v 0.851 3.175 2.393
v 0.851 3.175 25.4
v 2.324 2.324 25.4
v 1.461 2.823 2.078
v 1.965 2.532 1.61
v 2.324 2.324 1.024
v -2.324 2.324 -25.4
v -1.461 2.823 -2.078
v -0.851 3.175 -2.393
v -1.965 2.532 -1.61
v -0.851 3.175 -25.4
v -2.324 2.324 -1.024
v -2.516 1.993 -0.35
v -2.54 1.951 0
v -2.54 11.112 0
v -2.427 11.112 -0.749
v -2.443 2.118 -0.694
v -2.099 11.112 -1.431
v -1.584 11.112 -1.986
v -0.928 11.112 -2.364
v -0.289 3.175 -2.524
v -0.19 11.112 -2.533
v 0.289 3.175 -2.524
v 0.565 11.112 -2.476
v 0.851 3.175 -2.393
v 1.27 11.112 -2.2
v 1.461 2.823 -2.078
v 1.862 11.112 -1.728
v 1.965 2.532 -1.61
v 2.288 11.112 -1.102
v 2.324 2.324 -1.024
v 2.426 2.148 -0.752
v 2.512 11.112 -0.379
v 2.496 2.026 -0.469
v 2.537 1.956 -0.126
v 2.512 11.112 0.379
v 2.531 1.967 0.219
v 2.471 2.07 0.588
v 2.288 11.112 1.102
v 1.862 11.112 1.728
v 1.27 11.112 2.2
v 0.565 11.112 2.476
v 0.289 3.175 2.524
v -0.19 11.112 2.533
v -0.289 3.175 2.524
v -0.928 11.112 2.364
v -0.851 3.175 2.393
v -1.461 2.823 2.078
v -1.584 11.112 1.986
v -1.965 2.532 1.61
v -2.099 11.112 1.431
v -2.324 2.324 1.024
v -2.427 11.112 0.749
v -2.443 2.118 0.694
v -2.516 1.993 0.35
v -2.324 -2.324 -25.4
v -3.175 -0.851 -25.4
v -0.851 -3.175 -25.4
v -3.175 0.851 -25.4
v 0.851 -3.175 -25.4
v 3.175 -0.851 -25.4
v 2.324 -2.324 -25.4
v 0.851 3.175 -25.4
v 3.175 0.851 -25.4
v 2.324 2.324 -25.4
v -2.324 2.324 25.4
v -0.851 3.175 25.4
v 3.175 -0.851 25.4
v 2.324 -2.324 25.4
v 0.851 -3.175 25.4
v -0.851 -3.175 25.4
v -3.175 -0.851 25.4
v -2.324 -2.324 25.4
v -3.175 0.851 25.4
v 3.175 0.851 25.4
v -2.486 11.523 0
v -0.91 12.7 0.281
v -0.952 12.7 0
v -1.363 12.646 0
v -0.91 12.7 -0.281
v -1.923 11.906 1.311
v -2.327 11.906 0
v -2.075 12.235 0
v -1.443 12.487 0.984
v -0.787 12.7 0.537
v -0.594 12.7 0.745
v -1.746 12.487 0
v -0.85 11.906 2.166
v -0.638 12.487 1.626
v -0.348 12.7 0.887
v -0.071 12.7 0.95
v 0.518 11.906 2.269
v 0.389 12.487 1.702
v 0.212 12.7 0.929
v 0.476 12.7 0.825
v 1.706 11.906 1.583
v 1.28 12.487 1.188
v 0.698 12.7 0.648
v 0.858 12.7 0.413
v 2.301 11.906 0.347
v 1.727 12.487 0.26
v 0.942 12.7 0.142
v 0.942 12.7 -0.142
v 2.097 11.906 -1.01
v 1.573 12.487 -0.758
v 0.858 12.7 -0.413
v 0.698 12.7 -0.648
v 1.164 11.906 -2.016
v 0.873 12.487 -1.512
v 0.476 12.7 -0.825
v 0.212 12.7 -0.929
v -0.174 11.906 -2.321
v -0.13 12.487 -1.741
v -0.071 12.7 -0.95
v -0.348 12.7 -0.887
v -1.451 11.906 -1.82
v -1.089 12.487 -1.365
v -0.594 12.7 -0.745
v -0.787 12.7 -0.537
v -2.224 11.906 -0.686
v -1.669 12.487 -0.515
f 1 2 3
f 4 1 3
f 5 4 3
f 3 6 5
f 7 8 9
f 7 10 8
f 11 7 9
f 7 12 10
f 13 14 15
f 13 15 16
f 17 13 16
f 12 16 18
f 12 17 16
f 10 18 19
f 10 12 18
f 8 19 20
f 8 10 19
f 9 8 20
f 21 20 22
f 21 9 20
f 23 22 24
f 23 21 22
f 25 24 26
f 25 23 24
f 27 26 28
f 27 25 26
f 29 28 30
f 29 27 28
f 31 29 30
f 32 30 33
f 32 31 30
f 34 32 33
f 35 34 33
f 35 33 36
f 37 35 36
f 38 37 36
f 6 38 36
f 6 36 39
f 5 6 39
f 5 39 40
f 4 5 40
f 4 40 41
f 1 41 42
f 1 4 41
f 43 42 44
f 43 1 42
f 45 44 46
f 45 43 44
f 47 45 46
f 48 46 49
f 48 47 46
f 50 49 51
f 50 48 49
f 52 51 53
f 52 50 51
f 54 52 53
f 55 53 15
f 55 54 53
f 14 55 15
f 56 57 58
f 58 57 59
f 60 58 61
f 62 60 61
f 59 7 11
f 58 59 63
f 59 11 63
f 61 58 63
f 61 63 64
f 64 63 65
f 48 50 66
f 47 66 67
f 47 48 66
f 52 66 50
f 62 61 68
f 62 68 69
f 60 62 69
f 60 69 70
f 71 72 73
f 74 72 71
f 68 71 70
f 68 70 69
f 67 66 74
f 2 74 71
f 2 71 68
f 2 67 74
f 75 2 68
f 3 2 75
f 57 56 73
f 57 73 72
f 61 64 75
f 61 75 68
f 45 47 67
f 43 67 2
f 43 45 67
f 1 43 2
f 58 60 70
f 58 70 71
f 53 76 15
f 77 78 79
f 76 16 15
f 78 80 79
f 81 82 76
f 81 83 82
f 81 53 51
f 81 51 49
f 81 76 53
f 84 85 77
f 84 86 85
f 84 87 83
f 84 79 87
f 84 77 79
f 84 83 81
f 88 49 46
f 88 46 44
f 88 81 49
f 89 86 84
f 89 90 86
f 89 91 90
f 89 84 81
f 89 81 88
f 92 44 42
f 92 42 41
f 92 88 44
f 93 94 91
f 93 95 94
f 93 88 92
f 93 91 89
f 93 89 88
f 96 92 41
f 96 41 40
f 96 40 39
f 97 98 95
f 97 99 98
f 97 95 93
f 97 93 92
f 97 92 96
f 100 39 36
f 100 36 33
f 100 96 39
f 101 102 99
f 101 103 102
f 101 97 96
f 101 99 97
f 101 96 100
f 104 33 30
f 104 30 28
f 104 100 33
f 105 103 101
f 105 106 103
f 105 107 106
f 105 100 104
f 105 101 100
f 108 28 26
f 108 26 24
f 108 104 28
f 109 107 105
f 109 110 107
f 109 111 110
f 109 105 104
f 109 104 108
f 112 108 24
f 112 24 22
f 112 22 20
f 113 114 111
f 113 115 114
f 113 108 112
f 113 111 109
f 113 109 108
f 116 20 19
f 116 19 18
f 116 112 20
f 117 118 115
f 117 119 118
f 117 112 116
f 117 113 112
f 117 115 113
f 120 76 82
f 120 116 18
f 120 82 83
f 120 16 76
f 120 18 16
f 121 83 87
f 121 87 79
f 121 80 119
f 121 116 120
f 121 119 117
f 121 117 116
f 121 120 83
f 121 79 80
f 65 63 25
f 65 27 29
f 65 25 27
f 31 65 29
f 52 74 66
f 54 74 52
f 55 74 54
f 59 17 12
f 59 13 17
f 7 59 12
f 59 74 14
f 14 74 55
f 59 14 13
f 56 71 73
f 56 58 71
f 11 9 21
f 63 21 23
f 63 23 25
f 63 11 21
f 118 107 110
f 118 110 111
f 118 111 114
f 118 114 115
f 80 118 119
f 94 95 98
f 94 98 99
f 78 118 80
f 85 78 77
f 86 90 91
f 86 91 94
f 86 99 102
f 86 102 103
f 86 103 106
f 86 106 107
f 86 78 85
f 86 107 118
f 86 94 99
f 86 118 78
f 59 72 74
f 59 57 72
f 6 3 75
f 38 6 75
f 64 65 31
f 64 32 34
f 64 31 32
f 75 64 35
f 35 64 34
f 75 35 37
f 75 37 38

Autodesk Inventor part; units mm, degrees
ref_plane "YZ Plane" through (0, 0, 0) normal (1, 0, 0) x (0, 1, 0)
ref_plane "XZ Plane" through (0, 0, 0) normal (0, 1, 0) x (-1, 0, 0)
ref_plane "XY Plane" through (0, 0, 0) normal (0, 0, 1) x (1, 0, 0)
sketch "Sketch1" plane through (0, 0, 0) normal (0, 0, 1) x (1, 0, 0)
  line L0 (3.175, 0.8507) -> (3.175, -0.8507)
  line L1 (3.175, -0.8507) -> (2.3243, -2.3243)
  line L2 (2.3243, -2.3243) -> (0.8507, -3.175)
  line L3 (0.8507, -3.175) -> (-0.8507, -3.175)
  line L4 (-0.8507, -3.175) -> (-2.3243, -2.3243)
  line L5 (-2.3243, -2.3243) -> (-3.175, -0.8507)
  line L6 (-3.175, -0.8507) -> (-3.175, 0.8507)
  line L7 (-3.175, 0.8507) -> (-2.3243, 2.3243)
  line L8 (-2.3243, 2.3243) -> (-0.8507, 3.175)
  line L9 (-0.8507, 3.175) -> (0.8507, 3.175)
  line L10 (0.8507, 3.175) -> (2.3243, 2.3243)
  line L11 (2.3243, 2.3243) -> (3.175, 0.8507)
  line L12 (0, 0) -> (0, 3.175) construction
  dimension "d9" = 6.35
extrude "Extrusion1" add sketch "Sketch1" along normal blind 25.4 and the other way blind 25.4
sketch "Sketch2" plane through (0, 0, 0) normal (0, 1, 0) x (-1, 0, 0)
  circle A0 centre (0, 0) radius 2.54
  dimension "diamCamSlot" = 5.08
extrude "Extrusion2" add sketch "Sketch2" along normal blind 12.7
fillet "Fillet1" radius 1.5875 1 edges at (2.54, 12.7, 0)
equation "\"d9\" = camDiam"
equation "\"camDiam\" = 6.35"
properties part number "vexCamPost11"
